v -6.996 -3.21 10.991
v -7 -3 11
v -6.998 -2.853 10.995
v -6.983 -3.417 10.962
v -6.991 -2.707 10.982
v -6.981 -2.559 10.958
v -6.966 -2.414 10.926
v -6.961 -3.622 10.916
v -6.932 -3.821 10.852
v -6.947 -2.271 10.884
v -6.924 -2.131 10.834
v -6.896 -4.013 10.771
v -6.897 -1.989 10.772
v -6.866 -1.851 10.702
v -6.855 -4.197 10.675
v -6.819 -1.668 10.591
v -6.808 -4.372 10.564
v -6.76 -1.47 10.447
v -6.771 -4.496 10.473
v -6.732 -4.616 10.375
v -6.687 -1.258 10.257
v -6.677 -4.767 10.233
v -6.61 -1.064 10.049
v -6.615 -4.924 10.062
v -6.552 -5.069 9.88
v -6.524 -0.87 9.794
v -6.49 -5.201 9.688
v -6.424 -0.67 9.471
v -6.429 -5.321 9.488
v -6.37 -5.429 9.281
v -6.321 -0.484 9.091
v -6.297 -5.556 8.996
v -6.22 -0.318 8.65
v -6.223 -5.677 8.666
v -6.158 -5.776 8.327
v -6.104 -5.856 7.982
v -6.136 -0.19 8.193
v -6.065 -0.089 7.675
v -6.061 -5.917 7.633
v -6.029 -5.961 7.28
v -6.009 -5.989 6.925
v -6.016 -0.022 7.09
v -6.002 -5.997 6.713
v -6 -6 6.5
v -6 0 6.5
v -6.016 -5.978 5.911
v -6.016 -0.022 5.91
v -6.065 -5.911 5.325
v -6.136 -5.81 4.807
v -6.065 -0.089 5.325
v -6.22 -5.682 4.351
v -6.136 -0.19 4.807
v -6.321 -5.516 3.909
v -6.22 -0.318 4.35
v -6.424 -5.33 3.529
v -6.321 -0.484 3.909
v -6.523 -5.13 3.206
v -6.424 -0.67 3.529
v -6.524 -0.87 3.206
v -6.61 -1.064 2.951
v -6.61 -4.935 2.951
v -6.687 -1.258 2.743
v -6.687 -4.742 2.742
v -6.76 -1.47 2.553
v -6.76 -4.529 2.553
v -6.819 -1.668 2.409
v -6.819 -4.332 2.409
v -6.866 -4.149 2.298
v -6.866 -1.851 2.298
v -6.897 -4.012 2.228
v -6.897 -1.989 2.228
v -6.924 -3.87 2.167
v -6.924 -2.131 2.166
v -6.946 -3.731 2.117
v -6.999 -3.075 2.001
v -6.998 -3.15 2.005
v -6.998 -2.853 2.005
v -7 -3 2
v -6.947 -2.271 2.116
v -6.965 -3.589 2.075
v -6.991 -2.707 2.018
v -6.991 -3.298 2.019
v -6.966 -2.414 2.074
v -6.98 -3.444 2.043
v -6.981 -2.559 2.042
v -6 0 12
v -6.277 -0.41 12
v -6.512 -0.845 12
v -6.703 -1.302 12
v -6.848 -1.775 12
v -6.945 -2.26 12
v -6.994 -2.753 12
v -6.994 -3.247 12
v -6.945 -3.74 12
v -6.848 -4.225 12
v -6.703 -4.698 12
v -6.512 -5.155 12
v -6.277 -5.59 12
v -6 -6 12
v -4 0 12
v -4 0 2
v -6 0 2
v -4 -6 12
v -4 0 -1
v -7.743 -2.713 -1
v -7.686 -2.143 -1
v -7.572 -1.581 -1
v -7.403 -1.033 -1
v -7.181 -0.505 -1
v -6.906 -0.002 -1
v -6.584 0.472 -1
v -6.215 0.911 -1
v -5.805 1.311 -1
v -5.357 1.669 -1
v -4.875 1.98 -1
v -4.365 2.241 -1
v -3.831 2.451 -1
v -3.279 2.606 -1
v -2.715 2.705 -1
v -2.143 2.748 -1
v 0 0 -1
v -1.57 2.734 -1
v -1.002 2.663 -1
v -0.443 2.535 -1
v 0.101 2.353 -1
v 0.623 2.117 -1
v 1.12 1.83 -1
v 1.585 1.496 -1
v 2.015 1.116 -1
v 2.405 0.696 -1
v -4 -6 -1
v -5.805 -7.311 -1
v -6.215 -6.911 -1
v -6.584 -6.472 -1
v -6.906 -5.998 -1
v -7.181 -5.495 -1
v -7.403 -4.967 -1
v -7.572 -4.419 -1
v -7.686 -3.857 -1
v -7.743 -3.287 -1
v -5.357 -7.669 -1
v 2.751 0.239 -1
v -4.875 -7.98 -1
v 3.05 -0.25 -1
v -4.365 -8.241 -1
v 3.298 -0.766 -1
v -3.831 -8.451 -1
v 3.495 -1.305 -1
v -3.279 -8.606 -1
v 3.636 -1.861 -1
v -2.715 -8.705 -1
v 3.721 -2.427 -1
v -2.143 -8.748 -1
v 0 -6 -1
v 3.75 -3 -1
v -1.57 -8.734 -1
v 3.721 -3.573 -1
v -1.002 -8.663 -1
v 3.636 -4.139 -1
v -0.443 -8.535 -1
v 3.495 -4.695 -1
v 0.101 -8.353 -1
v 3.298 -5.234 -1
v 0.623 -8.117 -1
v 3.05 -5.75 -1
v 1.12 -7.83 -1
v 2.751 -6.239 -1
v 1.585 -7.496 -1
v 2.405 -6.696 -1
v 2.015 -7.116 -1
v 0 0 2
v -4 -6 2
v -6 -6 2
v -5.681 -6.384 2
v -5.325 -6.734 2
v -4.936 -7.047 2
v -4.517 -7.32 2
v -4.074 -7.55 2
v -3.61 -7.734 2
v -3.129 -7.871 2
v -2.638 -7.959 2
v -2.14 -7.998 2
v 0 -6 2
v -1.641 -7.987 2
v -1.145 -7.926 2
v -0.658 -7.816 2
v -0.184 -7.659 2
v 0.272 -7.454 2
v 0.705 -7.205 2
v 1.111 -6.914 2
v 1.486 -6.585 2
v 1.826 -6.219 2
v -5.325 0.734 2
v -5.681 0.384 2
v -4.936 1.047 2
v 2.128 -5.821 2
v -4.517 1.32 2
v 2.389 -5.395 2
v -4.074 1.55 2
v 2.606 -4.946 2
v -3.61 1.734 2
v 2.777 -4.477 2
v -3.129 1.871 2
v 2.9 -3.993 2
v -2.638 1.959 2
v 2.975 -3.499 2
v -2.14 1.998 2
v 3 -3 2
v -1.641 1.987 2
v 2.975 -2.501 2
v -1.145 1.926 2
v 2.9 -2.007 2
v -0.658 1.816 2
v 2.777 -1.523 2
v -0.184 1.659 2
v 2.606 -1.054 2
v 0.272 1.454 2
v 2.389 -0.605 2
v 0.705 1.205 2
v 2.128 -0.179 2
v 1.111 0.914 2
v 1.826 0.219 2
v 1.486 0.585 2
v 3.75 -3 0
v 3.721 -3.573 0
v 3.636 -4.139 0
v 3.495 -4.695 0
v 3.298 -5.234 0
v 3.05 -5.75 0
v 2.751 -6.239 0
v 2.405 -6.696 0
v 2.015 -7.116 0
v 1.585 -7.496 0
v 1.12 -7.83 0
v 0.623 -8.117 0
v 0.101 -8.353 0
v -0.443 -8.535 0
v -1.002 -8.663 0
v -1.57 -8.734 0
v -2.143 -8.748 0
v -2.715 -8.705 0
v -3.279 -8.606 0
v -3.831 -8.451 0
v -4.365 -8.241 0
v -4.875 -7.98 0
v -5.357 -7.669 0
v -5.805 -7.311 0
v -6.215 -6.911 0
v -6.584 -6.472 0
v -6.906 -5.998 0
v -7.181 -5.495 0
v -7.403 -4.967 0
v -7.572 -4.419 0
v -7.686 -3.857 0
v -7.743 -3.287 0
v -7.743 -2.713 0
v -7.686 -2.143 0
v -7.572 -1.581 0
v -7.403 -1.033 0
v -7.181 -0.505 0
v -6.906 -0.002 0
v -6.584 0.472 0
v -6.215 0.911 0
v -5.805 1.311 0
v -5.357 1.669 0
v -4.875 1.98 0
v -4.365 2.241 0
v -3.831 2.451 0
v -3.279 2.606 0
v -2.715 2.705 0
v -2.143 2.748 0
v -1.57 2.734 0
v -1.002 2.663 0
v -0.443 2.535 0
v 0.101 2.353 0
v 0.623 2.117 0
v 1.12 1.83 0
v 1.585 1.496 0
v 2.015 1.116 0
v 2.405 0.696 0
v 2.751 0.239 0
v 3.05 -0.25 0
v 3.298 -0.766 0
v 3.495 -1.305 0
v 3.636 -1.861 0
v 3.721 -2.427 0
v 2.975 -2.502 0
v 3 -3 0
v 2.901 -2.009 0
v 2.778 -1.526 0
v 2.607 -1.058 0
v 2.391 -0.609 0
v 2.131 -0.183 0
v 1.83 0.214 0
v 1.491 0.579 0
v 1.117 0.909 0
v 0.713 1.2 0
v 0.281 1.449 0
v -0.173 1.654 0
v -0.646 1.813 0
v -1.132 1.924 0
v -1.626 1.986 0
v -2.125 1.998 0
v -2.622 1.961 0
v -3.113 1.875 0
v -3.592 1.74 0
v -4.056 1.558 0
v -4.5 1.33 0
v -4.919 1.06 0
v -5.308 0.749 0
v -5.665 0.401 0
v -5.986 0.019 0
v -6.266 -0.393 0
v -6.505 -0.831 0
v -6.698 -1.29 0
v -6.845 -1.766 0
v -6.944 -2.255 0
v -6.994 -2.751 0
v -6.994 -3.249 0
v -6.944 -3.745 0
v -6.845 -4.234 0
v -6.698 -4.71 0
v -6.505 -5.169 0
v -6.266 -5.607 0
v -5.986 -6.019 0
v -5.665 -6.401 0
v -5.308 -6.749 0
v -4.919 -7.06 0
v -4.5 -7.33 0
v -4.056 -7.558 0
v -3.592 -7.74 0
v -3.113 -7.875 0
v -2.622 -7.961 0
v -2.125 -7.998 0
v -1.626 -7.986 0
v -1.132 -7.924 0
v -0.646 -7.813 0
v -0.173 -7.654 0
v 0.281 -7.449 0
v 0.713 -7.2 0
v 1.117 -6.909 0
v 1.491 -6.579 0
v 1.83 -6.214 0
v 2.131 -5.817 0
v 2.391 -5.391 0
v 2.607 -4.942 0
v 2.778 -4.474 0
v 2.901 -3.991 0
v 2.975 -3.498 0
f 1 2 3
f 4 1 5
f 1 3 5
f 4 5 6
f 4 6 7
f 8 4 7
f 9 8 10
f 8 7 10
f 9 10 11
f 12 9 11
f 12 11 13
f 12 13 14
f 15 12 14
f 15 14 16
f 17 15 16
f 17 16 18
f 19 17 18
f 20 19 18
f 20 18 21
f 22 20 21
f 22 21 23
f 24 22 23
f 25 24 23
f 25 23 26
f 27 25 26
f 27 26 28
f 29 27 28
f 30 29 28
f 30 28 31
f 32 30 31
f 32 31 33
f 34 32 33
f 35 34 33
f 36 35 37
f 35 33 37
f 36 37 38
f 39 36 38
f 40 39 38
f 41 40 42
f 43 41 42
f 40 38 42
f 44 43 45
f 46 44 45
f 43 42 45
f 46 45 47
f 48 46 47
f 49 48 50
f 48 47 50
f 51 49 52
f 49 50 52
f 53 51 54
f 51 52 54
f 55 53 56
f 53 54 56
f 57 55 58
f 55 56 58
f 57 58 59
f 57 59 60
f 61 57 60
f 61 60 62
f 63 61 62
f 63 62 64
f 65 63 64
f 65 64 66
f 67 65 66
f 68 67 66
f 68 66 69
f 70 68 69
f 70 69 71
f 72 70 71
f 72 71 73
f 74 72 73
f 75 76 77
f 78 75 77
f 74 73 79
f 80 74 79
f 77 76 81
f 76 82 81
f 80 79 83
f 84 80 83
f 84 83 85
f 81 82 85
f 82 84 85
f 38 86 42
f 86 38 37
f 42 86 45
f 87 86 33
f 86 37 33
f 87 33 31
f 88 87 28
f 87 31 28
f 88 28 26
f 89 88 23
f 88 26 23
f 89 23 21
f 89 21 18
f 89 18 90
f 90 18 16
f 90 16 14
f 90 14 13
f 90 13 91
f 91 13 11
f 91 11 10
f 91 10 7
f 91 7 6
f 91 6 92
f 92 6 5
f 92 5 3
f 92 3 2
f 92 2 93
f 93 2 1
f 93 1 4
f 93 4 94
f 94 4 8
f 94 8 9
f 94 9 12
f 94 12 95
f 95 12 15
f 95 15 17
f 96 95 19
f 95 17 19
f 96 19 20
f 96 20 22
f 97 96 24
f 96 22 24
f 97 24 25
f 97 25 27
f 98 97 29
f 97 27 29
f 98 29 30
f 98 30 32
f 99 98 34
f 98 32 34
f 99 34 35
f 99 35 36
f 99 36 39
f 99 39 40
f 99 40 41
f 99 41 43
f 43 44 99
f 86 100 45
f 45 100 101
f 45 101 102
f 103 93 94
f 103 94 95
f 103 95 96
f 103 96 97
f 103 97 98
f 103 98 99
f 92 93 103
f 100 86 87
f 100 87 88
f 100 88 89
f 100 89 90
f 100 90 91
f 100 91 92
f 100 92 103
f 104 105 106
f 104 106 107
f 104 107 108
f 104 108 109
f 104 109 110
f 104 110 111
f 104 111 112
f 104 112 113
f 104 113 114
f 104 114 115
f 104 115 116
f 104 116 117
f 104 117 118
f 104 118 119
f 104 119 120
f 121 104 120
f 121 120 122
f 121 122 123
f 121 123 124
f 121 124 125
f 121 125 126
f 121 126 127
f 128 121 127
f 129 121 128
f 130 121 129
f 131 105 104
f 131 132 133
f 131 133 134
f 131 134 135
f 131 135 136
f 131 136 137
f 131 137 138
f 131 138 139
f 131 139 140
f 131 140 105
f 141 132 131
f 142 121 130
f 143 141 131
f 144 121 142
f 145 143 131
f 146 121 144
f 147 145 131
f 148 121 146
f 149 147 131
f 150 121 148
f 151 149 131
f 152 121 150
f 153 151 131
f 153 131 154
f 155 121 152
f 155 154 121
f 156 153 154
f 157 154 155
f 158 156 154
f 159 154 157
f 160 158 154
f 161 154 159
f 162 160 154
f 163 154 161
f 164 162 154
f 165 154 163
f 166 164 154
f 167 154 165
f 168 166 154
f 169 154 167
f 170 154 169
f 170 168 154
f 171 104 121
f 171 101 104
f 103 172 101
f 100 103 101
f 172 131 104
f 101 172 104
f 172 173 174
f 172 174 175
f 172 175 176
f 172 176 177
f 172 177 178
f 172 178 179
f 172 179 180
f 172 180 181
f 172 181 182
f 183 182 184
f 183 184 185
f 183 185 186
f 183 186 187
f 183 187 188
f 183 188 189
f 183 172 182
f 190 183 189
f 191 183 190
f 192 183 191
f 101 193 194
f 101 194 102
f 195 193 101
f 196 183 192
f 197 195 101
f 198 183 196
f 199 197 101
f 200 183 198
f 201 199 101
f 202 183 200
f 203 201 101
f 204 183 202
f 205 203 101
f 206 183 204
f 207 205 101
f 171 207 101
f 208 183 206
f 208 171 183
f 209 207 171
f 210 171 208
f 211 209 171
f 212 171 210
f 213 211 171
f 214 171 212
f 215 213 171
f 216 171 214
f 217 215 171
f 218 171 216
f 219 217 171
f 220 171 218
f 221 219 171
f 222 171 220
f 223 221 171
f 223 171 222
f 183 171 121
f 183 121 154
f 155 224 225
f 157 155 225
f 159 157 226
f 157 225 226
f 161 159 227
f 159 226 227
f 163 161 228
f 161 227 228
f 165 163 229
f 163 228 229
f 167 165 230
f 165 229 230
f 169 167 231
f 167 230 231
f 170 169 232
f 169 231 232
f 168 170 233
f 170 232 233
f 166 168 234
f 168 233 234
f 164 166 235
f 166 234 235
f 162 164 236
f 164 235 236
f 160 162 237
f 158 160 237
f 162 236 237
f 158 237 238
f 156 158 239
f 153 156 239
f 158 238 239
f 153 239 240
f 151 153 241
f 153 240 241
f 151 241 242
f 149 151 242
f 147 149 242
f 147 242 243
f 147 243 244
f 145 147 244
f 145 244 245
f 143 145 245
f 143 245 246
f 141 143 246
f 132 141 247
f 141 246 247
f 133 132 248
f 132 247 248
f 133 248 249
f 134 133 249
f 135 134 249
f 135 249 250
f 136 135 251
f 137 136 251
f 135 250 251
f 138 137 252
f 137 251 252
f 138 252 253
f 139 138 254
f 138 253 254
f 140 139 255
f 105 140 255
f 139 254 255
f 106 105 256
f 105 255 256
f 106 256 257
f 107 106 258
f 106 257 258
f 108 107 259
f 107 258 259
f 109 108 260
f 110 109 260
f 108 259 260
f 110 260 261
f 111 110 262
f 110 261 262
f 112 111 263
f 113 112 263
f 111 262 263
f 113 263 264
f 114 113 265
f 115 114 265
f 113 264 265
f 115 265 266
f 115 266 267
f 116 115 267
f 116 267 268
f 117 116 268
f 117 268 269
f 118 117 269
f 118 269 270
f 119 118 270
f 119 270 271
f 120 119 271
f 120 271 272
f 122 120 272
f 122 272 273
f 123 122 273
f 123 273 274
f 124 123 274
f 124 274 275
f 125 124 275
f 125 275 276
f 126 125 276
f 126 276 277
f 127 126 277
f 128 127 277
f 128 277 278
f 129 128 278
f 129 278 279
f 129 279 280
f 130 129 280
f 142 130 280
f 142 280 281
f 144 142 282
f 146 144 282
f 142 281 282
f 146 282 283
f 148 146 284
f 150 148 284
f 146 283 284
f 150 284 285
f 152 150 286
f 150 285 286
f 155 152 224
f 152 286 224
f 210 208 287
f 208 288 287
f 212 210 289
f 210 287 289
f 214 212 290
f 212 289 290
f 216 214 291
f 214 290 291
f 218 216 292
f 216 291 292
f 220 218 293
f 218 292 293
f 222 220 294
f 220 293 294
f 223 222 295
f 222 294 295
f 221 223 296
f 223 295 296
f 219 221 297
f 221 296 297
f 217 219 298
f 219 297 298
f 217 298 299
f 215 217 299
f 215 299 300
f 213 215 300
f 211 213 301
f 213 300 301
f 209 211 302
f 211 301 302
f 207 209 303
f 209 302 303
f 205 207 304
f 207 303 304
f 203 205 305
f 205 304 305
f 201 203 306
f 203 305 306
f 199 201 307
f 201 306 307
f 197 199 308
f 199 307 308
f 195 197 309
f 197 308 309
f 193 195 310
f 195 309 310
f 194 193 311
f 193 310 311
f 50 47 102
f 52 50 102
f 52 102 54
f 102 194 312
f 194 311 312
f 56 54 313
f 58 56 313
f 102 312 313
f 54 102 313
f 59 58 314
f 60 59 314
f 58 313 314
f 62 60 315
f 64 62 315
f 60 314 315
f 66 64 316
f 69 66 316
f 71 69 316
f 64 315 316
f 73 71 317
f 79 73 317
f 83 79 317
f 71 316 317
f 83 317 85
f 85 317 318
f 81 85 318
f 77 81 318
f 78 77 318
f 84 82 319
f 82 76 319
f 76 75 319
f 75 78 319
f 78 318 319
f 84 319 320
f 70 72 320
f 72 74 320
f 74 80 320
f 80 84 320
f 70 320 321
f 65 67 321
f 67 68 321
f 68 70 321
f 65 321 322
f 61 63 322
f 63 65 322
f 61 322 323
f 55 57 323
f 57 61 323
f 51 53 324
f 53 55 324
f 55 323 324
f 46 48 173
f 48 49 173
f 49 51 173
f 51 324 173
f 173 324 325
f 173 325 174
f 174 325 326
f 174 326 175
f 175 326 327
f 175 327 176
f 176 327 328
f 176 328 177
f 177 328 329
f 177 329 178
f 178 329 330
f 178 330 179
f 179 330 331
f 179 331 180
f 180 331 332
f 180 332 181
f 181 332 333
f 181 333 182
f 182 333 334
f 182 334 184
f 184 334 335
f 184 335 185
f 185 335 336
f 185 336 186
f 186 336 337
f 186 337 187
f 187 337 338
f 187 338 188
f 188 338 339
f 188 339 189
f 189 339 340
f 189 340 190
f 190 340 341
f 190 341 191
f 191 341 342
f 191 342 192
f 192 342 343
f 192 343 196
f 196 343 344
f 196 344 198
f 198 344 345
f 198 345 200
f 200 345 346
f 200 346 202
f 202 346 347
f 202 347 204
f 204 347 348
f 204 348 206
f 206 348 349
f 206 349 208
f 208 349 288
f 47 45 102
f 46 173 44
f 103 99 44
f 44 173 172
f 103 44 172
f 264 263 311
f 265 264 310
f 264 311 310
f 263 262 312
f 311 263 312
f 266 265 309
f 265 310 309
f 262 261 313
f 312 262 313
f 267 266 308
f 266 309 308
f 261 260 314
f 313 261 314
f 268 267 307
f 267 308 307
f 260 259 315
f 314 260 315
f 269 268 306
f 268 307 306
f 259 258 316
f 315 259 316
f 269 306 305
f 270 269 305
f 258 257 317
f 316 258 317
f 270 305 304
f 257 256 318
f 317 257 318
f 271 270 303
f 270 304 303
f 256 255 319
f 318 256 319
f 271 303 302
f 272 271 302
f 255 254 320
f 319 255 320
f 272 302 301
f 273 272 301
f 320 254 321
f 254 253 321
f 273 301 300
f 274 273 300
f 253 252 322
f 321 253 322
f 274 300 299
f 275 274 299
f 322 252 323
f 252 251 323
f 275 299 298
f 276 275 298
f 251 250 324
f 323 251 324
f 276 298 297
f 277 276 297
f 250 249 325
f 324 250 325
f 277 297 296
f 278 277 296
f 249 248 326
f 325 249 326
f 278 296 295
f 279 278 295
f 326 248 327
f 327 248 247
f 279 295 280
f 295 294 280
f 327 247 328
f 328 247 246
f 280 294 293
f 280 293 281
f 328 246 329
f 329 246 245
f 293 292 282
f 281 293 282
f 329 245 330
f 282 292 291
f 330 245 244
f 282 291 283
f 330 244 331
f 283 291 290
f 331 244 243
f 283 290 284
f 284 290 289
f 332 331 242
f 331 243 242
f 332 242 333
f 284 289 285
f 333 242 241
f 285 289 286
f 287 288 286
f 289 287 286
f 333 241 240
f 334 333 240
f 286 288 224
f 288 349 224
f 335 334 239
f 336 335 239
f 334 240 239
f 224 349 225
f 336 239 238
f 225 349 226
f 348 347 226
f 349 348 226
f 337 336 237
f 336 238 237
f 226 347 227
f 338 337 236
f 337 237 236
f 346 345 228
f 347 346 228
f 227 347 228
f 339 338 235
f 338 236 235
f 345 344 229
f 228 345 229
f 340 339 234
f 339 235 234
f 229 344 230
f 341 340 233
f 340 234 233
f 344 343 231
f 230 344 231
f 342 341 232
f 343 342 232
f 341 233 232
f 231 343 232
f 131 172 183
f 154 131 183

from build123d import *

# Parameters (mm, degrees)
F0_R     = 5
F0_W     = 4
F0_H     = 6
F1_DEPTH = 2
F2_R     = 5.75
F2_W     = 4
F2_H     = 6
F3_DEPTH = 1
F5_DEPTH = 10
F7_DEPTH = 8.751


with BuildPart() as f1:
    # F0 (on Top) → F1 (new body)
    with BuildSketch(Plane.XY):
        with Locations((-2, -3)):
            Circle(F0_R)
        with Locations((-2, -3)):
            Rectangle(F0_W, F0_H, mode=Mode.SUBTRACT)
    extrude(amount=F1_DEPTH)

    # F2 (on face) → F3 (join)
    with BuildSketch(Plane(origin=(0, 0, 0), x_dir=(1, 0, 0), z_dir=(0, 0, -1))):
        with Locations((-2, 3)):
            Circle(F2_R)
        with Locations((-2, 3)):
            Rectangle(F2_W, F2_H, mode=Mode.SUBTRACT)
    extrude(amount=F3_DEPTH)

    # F4 (on face) → F5 (join)
    with BuildSketch(Plane.XY.offset(2)):
        with BuildLine():
            Line((-4, -6), (-4, 0))
            Line((-4, 0), (-6, 0))
            ThreePointArc((-6, 0), (-7, -3), (-6, -6))
            Line((-6, -6), (-4, -6))
        make_face()
    extrude(amount=F5_DEPTH)

    # F6 (on face) → F7 (cut, through all)
    with BuildSketch(Plane(origin=(0, 0, 0), x_dir=(-1, 0, 0), z_dir=(0, 1, 0))):
        with BuildLine():
            Line((7, 2), (7, 11))
            ThreePointArc((7, 11), (6, 6.5), (7, 2))
        make_face()
    extrude(amount=-F7_DEPTH, mode=Mode.SUBTRACT)


solid = f1.part
